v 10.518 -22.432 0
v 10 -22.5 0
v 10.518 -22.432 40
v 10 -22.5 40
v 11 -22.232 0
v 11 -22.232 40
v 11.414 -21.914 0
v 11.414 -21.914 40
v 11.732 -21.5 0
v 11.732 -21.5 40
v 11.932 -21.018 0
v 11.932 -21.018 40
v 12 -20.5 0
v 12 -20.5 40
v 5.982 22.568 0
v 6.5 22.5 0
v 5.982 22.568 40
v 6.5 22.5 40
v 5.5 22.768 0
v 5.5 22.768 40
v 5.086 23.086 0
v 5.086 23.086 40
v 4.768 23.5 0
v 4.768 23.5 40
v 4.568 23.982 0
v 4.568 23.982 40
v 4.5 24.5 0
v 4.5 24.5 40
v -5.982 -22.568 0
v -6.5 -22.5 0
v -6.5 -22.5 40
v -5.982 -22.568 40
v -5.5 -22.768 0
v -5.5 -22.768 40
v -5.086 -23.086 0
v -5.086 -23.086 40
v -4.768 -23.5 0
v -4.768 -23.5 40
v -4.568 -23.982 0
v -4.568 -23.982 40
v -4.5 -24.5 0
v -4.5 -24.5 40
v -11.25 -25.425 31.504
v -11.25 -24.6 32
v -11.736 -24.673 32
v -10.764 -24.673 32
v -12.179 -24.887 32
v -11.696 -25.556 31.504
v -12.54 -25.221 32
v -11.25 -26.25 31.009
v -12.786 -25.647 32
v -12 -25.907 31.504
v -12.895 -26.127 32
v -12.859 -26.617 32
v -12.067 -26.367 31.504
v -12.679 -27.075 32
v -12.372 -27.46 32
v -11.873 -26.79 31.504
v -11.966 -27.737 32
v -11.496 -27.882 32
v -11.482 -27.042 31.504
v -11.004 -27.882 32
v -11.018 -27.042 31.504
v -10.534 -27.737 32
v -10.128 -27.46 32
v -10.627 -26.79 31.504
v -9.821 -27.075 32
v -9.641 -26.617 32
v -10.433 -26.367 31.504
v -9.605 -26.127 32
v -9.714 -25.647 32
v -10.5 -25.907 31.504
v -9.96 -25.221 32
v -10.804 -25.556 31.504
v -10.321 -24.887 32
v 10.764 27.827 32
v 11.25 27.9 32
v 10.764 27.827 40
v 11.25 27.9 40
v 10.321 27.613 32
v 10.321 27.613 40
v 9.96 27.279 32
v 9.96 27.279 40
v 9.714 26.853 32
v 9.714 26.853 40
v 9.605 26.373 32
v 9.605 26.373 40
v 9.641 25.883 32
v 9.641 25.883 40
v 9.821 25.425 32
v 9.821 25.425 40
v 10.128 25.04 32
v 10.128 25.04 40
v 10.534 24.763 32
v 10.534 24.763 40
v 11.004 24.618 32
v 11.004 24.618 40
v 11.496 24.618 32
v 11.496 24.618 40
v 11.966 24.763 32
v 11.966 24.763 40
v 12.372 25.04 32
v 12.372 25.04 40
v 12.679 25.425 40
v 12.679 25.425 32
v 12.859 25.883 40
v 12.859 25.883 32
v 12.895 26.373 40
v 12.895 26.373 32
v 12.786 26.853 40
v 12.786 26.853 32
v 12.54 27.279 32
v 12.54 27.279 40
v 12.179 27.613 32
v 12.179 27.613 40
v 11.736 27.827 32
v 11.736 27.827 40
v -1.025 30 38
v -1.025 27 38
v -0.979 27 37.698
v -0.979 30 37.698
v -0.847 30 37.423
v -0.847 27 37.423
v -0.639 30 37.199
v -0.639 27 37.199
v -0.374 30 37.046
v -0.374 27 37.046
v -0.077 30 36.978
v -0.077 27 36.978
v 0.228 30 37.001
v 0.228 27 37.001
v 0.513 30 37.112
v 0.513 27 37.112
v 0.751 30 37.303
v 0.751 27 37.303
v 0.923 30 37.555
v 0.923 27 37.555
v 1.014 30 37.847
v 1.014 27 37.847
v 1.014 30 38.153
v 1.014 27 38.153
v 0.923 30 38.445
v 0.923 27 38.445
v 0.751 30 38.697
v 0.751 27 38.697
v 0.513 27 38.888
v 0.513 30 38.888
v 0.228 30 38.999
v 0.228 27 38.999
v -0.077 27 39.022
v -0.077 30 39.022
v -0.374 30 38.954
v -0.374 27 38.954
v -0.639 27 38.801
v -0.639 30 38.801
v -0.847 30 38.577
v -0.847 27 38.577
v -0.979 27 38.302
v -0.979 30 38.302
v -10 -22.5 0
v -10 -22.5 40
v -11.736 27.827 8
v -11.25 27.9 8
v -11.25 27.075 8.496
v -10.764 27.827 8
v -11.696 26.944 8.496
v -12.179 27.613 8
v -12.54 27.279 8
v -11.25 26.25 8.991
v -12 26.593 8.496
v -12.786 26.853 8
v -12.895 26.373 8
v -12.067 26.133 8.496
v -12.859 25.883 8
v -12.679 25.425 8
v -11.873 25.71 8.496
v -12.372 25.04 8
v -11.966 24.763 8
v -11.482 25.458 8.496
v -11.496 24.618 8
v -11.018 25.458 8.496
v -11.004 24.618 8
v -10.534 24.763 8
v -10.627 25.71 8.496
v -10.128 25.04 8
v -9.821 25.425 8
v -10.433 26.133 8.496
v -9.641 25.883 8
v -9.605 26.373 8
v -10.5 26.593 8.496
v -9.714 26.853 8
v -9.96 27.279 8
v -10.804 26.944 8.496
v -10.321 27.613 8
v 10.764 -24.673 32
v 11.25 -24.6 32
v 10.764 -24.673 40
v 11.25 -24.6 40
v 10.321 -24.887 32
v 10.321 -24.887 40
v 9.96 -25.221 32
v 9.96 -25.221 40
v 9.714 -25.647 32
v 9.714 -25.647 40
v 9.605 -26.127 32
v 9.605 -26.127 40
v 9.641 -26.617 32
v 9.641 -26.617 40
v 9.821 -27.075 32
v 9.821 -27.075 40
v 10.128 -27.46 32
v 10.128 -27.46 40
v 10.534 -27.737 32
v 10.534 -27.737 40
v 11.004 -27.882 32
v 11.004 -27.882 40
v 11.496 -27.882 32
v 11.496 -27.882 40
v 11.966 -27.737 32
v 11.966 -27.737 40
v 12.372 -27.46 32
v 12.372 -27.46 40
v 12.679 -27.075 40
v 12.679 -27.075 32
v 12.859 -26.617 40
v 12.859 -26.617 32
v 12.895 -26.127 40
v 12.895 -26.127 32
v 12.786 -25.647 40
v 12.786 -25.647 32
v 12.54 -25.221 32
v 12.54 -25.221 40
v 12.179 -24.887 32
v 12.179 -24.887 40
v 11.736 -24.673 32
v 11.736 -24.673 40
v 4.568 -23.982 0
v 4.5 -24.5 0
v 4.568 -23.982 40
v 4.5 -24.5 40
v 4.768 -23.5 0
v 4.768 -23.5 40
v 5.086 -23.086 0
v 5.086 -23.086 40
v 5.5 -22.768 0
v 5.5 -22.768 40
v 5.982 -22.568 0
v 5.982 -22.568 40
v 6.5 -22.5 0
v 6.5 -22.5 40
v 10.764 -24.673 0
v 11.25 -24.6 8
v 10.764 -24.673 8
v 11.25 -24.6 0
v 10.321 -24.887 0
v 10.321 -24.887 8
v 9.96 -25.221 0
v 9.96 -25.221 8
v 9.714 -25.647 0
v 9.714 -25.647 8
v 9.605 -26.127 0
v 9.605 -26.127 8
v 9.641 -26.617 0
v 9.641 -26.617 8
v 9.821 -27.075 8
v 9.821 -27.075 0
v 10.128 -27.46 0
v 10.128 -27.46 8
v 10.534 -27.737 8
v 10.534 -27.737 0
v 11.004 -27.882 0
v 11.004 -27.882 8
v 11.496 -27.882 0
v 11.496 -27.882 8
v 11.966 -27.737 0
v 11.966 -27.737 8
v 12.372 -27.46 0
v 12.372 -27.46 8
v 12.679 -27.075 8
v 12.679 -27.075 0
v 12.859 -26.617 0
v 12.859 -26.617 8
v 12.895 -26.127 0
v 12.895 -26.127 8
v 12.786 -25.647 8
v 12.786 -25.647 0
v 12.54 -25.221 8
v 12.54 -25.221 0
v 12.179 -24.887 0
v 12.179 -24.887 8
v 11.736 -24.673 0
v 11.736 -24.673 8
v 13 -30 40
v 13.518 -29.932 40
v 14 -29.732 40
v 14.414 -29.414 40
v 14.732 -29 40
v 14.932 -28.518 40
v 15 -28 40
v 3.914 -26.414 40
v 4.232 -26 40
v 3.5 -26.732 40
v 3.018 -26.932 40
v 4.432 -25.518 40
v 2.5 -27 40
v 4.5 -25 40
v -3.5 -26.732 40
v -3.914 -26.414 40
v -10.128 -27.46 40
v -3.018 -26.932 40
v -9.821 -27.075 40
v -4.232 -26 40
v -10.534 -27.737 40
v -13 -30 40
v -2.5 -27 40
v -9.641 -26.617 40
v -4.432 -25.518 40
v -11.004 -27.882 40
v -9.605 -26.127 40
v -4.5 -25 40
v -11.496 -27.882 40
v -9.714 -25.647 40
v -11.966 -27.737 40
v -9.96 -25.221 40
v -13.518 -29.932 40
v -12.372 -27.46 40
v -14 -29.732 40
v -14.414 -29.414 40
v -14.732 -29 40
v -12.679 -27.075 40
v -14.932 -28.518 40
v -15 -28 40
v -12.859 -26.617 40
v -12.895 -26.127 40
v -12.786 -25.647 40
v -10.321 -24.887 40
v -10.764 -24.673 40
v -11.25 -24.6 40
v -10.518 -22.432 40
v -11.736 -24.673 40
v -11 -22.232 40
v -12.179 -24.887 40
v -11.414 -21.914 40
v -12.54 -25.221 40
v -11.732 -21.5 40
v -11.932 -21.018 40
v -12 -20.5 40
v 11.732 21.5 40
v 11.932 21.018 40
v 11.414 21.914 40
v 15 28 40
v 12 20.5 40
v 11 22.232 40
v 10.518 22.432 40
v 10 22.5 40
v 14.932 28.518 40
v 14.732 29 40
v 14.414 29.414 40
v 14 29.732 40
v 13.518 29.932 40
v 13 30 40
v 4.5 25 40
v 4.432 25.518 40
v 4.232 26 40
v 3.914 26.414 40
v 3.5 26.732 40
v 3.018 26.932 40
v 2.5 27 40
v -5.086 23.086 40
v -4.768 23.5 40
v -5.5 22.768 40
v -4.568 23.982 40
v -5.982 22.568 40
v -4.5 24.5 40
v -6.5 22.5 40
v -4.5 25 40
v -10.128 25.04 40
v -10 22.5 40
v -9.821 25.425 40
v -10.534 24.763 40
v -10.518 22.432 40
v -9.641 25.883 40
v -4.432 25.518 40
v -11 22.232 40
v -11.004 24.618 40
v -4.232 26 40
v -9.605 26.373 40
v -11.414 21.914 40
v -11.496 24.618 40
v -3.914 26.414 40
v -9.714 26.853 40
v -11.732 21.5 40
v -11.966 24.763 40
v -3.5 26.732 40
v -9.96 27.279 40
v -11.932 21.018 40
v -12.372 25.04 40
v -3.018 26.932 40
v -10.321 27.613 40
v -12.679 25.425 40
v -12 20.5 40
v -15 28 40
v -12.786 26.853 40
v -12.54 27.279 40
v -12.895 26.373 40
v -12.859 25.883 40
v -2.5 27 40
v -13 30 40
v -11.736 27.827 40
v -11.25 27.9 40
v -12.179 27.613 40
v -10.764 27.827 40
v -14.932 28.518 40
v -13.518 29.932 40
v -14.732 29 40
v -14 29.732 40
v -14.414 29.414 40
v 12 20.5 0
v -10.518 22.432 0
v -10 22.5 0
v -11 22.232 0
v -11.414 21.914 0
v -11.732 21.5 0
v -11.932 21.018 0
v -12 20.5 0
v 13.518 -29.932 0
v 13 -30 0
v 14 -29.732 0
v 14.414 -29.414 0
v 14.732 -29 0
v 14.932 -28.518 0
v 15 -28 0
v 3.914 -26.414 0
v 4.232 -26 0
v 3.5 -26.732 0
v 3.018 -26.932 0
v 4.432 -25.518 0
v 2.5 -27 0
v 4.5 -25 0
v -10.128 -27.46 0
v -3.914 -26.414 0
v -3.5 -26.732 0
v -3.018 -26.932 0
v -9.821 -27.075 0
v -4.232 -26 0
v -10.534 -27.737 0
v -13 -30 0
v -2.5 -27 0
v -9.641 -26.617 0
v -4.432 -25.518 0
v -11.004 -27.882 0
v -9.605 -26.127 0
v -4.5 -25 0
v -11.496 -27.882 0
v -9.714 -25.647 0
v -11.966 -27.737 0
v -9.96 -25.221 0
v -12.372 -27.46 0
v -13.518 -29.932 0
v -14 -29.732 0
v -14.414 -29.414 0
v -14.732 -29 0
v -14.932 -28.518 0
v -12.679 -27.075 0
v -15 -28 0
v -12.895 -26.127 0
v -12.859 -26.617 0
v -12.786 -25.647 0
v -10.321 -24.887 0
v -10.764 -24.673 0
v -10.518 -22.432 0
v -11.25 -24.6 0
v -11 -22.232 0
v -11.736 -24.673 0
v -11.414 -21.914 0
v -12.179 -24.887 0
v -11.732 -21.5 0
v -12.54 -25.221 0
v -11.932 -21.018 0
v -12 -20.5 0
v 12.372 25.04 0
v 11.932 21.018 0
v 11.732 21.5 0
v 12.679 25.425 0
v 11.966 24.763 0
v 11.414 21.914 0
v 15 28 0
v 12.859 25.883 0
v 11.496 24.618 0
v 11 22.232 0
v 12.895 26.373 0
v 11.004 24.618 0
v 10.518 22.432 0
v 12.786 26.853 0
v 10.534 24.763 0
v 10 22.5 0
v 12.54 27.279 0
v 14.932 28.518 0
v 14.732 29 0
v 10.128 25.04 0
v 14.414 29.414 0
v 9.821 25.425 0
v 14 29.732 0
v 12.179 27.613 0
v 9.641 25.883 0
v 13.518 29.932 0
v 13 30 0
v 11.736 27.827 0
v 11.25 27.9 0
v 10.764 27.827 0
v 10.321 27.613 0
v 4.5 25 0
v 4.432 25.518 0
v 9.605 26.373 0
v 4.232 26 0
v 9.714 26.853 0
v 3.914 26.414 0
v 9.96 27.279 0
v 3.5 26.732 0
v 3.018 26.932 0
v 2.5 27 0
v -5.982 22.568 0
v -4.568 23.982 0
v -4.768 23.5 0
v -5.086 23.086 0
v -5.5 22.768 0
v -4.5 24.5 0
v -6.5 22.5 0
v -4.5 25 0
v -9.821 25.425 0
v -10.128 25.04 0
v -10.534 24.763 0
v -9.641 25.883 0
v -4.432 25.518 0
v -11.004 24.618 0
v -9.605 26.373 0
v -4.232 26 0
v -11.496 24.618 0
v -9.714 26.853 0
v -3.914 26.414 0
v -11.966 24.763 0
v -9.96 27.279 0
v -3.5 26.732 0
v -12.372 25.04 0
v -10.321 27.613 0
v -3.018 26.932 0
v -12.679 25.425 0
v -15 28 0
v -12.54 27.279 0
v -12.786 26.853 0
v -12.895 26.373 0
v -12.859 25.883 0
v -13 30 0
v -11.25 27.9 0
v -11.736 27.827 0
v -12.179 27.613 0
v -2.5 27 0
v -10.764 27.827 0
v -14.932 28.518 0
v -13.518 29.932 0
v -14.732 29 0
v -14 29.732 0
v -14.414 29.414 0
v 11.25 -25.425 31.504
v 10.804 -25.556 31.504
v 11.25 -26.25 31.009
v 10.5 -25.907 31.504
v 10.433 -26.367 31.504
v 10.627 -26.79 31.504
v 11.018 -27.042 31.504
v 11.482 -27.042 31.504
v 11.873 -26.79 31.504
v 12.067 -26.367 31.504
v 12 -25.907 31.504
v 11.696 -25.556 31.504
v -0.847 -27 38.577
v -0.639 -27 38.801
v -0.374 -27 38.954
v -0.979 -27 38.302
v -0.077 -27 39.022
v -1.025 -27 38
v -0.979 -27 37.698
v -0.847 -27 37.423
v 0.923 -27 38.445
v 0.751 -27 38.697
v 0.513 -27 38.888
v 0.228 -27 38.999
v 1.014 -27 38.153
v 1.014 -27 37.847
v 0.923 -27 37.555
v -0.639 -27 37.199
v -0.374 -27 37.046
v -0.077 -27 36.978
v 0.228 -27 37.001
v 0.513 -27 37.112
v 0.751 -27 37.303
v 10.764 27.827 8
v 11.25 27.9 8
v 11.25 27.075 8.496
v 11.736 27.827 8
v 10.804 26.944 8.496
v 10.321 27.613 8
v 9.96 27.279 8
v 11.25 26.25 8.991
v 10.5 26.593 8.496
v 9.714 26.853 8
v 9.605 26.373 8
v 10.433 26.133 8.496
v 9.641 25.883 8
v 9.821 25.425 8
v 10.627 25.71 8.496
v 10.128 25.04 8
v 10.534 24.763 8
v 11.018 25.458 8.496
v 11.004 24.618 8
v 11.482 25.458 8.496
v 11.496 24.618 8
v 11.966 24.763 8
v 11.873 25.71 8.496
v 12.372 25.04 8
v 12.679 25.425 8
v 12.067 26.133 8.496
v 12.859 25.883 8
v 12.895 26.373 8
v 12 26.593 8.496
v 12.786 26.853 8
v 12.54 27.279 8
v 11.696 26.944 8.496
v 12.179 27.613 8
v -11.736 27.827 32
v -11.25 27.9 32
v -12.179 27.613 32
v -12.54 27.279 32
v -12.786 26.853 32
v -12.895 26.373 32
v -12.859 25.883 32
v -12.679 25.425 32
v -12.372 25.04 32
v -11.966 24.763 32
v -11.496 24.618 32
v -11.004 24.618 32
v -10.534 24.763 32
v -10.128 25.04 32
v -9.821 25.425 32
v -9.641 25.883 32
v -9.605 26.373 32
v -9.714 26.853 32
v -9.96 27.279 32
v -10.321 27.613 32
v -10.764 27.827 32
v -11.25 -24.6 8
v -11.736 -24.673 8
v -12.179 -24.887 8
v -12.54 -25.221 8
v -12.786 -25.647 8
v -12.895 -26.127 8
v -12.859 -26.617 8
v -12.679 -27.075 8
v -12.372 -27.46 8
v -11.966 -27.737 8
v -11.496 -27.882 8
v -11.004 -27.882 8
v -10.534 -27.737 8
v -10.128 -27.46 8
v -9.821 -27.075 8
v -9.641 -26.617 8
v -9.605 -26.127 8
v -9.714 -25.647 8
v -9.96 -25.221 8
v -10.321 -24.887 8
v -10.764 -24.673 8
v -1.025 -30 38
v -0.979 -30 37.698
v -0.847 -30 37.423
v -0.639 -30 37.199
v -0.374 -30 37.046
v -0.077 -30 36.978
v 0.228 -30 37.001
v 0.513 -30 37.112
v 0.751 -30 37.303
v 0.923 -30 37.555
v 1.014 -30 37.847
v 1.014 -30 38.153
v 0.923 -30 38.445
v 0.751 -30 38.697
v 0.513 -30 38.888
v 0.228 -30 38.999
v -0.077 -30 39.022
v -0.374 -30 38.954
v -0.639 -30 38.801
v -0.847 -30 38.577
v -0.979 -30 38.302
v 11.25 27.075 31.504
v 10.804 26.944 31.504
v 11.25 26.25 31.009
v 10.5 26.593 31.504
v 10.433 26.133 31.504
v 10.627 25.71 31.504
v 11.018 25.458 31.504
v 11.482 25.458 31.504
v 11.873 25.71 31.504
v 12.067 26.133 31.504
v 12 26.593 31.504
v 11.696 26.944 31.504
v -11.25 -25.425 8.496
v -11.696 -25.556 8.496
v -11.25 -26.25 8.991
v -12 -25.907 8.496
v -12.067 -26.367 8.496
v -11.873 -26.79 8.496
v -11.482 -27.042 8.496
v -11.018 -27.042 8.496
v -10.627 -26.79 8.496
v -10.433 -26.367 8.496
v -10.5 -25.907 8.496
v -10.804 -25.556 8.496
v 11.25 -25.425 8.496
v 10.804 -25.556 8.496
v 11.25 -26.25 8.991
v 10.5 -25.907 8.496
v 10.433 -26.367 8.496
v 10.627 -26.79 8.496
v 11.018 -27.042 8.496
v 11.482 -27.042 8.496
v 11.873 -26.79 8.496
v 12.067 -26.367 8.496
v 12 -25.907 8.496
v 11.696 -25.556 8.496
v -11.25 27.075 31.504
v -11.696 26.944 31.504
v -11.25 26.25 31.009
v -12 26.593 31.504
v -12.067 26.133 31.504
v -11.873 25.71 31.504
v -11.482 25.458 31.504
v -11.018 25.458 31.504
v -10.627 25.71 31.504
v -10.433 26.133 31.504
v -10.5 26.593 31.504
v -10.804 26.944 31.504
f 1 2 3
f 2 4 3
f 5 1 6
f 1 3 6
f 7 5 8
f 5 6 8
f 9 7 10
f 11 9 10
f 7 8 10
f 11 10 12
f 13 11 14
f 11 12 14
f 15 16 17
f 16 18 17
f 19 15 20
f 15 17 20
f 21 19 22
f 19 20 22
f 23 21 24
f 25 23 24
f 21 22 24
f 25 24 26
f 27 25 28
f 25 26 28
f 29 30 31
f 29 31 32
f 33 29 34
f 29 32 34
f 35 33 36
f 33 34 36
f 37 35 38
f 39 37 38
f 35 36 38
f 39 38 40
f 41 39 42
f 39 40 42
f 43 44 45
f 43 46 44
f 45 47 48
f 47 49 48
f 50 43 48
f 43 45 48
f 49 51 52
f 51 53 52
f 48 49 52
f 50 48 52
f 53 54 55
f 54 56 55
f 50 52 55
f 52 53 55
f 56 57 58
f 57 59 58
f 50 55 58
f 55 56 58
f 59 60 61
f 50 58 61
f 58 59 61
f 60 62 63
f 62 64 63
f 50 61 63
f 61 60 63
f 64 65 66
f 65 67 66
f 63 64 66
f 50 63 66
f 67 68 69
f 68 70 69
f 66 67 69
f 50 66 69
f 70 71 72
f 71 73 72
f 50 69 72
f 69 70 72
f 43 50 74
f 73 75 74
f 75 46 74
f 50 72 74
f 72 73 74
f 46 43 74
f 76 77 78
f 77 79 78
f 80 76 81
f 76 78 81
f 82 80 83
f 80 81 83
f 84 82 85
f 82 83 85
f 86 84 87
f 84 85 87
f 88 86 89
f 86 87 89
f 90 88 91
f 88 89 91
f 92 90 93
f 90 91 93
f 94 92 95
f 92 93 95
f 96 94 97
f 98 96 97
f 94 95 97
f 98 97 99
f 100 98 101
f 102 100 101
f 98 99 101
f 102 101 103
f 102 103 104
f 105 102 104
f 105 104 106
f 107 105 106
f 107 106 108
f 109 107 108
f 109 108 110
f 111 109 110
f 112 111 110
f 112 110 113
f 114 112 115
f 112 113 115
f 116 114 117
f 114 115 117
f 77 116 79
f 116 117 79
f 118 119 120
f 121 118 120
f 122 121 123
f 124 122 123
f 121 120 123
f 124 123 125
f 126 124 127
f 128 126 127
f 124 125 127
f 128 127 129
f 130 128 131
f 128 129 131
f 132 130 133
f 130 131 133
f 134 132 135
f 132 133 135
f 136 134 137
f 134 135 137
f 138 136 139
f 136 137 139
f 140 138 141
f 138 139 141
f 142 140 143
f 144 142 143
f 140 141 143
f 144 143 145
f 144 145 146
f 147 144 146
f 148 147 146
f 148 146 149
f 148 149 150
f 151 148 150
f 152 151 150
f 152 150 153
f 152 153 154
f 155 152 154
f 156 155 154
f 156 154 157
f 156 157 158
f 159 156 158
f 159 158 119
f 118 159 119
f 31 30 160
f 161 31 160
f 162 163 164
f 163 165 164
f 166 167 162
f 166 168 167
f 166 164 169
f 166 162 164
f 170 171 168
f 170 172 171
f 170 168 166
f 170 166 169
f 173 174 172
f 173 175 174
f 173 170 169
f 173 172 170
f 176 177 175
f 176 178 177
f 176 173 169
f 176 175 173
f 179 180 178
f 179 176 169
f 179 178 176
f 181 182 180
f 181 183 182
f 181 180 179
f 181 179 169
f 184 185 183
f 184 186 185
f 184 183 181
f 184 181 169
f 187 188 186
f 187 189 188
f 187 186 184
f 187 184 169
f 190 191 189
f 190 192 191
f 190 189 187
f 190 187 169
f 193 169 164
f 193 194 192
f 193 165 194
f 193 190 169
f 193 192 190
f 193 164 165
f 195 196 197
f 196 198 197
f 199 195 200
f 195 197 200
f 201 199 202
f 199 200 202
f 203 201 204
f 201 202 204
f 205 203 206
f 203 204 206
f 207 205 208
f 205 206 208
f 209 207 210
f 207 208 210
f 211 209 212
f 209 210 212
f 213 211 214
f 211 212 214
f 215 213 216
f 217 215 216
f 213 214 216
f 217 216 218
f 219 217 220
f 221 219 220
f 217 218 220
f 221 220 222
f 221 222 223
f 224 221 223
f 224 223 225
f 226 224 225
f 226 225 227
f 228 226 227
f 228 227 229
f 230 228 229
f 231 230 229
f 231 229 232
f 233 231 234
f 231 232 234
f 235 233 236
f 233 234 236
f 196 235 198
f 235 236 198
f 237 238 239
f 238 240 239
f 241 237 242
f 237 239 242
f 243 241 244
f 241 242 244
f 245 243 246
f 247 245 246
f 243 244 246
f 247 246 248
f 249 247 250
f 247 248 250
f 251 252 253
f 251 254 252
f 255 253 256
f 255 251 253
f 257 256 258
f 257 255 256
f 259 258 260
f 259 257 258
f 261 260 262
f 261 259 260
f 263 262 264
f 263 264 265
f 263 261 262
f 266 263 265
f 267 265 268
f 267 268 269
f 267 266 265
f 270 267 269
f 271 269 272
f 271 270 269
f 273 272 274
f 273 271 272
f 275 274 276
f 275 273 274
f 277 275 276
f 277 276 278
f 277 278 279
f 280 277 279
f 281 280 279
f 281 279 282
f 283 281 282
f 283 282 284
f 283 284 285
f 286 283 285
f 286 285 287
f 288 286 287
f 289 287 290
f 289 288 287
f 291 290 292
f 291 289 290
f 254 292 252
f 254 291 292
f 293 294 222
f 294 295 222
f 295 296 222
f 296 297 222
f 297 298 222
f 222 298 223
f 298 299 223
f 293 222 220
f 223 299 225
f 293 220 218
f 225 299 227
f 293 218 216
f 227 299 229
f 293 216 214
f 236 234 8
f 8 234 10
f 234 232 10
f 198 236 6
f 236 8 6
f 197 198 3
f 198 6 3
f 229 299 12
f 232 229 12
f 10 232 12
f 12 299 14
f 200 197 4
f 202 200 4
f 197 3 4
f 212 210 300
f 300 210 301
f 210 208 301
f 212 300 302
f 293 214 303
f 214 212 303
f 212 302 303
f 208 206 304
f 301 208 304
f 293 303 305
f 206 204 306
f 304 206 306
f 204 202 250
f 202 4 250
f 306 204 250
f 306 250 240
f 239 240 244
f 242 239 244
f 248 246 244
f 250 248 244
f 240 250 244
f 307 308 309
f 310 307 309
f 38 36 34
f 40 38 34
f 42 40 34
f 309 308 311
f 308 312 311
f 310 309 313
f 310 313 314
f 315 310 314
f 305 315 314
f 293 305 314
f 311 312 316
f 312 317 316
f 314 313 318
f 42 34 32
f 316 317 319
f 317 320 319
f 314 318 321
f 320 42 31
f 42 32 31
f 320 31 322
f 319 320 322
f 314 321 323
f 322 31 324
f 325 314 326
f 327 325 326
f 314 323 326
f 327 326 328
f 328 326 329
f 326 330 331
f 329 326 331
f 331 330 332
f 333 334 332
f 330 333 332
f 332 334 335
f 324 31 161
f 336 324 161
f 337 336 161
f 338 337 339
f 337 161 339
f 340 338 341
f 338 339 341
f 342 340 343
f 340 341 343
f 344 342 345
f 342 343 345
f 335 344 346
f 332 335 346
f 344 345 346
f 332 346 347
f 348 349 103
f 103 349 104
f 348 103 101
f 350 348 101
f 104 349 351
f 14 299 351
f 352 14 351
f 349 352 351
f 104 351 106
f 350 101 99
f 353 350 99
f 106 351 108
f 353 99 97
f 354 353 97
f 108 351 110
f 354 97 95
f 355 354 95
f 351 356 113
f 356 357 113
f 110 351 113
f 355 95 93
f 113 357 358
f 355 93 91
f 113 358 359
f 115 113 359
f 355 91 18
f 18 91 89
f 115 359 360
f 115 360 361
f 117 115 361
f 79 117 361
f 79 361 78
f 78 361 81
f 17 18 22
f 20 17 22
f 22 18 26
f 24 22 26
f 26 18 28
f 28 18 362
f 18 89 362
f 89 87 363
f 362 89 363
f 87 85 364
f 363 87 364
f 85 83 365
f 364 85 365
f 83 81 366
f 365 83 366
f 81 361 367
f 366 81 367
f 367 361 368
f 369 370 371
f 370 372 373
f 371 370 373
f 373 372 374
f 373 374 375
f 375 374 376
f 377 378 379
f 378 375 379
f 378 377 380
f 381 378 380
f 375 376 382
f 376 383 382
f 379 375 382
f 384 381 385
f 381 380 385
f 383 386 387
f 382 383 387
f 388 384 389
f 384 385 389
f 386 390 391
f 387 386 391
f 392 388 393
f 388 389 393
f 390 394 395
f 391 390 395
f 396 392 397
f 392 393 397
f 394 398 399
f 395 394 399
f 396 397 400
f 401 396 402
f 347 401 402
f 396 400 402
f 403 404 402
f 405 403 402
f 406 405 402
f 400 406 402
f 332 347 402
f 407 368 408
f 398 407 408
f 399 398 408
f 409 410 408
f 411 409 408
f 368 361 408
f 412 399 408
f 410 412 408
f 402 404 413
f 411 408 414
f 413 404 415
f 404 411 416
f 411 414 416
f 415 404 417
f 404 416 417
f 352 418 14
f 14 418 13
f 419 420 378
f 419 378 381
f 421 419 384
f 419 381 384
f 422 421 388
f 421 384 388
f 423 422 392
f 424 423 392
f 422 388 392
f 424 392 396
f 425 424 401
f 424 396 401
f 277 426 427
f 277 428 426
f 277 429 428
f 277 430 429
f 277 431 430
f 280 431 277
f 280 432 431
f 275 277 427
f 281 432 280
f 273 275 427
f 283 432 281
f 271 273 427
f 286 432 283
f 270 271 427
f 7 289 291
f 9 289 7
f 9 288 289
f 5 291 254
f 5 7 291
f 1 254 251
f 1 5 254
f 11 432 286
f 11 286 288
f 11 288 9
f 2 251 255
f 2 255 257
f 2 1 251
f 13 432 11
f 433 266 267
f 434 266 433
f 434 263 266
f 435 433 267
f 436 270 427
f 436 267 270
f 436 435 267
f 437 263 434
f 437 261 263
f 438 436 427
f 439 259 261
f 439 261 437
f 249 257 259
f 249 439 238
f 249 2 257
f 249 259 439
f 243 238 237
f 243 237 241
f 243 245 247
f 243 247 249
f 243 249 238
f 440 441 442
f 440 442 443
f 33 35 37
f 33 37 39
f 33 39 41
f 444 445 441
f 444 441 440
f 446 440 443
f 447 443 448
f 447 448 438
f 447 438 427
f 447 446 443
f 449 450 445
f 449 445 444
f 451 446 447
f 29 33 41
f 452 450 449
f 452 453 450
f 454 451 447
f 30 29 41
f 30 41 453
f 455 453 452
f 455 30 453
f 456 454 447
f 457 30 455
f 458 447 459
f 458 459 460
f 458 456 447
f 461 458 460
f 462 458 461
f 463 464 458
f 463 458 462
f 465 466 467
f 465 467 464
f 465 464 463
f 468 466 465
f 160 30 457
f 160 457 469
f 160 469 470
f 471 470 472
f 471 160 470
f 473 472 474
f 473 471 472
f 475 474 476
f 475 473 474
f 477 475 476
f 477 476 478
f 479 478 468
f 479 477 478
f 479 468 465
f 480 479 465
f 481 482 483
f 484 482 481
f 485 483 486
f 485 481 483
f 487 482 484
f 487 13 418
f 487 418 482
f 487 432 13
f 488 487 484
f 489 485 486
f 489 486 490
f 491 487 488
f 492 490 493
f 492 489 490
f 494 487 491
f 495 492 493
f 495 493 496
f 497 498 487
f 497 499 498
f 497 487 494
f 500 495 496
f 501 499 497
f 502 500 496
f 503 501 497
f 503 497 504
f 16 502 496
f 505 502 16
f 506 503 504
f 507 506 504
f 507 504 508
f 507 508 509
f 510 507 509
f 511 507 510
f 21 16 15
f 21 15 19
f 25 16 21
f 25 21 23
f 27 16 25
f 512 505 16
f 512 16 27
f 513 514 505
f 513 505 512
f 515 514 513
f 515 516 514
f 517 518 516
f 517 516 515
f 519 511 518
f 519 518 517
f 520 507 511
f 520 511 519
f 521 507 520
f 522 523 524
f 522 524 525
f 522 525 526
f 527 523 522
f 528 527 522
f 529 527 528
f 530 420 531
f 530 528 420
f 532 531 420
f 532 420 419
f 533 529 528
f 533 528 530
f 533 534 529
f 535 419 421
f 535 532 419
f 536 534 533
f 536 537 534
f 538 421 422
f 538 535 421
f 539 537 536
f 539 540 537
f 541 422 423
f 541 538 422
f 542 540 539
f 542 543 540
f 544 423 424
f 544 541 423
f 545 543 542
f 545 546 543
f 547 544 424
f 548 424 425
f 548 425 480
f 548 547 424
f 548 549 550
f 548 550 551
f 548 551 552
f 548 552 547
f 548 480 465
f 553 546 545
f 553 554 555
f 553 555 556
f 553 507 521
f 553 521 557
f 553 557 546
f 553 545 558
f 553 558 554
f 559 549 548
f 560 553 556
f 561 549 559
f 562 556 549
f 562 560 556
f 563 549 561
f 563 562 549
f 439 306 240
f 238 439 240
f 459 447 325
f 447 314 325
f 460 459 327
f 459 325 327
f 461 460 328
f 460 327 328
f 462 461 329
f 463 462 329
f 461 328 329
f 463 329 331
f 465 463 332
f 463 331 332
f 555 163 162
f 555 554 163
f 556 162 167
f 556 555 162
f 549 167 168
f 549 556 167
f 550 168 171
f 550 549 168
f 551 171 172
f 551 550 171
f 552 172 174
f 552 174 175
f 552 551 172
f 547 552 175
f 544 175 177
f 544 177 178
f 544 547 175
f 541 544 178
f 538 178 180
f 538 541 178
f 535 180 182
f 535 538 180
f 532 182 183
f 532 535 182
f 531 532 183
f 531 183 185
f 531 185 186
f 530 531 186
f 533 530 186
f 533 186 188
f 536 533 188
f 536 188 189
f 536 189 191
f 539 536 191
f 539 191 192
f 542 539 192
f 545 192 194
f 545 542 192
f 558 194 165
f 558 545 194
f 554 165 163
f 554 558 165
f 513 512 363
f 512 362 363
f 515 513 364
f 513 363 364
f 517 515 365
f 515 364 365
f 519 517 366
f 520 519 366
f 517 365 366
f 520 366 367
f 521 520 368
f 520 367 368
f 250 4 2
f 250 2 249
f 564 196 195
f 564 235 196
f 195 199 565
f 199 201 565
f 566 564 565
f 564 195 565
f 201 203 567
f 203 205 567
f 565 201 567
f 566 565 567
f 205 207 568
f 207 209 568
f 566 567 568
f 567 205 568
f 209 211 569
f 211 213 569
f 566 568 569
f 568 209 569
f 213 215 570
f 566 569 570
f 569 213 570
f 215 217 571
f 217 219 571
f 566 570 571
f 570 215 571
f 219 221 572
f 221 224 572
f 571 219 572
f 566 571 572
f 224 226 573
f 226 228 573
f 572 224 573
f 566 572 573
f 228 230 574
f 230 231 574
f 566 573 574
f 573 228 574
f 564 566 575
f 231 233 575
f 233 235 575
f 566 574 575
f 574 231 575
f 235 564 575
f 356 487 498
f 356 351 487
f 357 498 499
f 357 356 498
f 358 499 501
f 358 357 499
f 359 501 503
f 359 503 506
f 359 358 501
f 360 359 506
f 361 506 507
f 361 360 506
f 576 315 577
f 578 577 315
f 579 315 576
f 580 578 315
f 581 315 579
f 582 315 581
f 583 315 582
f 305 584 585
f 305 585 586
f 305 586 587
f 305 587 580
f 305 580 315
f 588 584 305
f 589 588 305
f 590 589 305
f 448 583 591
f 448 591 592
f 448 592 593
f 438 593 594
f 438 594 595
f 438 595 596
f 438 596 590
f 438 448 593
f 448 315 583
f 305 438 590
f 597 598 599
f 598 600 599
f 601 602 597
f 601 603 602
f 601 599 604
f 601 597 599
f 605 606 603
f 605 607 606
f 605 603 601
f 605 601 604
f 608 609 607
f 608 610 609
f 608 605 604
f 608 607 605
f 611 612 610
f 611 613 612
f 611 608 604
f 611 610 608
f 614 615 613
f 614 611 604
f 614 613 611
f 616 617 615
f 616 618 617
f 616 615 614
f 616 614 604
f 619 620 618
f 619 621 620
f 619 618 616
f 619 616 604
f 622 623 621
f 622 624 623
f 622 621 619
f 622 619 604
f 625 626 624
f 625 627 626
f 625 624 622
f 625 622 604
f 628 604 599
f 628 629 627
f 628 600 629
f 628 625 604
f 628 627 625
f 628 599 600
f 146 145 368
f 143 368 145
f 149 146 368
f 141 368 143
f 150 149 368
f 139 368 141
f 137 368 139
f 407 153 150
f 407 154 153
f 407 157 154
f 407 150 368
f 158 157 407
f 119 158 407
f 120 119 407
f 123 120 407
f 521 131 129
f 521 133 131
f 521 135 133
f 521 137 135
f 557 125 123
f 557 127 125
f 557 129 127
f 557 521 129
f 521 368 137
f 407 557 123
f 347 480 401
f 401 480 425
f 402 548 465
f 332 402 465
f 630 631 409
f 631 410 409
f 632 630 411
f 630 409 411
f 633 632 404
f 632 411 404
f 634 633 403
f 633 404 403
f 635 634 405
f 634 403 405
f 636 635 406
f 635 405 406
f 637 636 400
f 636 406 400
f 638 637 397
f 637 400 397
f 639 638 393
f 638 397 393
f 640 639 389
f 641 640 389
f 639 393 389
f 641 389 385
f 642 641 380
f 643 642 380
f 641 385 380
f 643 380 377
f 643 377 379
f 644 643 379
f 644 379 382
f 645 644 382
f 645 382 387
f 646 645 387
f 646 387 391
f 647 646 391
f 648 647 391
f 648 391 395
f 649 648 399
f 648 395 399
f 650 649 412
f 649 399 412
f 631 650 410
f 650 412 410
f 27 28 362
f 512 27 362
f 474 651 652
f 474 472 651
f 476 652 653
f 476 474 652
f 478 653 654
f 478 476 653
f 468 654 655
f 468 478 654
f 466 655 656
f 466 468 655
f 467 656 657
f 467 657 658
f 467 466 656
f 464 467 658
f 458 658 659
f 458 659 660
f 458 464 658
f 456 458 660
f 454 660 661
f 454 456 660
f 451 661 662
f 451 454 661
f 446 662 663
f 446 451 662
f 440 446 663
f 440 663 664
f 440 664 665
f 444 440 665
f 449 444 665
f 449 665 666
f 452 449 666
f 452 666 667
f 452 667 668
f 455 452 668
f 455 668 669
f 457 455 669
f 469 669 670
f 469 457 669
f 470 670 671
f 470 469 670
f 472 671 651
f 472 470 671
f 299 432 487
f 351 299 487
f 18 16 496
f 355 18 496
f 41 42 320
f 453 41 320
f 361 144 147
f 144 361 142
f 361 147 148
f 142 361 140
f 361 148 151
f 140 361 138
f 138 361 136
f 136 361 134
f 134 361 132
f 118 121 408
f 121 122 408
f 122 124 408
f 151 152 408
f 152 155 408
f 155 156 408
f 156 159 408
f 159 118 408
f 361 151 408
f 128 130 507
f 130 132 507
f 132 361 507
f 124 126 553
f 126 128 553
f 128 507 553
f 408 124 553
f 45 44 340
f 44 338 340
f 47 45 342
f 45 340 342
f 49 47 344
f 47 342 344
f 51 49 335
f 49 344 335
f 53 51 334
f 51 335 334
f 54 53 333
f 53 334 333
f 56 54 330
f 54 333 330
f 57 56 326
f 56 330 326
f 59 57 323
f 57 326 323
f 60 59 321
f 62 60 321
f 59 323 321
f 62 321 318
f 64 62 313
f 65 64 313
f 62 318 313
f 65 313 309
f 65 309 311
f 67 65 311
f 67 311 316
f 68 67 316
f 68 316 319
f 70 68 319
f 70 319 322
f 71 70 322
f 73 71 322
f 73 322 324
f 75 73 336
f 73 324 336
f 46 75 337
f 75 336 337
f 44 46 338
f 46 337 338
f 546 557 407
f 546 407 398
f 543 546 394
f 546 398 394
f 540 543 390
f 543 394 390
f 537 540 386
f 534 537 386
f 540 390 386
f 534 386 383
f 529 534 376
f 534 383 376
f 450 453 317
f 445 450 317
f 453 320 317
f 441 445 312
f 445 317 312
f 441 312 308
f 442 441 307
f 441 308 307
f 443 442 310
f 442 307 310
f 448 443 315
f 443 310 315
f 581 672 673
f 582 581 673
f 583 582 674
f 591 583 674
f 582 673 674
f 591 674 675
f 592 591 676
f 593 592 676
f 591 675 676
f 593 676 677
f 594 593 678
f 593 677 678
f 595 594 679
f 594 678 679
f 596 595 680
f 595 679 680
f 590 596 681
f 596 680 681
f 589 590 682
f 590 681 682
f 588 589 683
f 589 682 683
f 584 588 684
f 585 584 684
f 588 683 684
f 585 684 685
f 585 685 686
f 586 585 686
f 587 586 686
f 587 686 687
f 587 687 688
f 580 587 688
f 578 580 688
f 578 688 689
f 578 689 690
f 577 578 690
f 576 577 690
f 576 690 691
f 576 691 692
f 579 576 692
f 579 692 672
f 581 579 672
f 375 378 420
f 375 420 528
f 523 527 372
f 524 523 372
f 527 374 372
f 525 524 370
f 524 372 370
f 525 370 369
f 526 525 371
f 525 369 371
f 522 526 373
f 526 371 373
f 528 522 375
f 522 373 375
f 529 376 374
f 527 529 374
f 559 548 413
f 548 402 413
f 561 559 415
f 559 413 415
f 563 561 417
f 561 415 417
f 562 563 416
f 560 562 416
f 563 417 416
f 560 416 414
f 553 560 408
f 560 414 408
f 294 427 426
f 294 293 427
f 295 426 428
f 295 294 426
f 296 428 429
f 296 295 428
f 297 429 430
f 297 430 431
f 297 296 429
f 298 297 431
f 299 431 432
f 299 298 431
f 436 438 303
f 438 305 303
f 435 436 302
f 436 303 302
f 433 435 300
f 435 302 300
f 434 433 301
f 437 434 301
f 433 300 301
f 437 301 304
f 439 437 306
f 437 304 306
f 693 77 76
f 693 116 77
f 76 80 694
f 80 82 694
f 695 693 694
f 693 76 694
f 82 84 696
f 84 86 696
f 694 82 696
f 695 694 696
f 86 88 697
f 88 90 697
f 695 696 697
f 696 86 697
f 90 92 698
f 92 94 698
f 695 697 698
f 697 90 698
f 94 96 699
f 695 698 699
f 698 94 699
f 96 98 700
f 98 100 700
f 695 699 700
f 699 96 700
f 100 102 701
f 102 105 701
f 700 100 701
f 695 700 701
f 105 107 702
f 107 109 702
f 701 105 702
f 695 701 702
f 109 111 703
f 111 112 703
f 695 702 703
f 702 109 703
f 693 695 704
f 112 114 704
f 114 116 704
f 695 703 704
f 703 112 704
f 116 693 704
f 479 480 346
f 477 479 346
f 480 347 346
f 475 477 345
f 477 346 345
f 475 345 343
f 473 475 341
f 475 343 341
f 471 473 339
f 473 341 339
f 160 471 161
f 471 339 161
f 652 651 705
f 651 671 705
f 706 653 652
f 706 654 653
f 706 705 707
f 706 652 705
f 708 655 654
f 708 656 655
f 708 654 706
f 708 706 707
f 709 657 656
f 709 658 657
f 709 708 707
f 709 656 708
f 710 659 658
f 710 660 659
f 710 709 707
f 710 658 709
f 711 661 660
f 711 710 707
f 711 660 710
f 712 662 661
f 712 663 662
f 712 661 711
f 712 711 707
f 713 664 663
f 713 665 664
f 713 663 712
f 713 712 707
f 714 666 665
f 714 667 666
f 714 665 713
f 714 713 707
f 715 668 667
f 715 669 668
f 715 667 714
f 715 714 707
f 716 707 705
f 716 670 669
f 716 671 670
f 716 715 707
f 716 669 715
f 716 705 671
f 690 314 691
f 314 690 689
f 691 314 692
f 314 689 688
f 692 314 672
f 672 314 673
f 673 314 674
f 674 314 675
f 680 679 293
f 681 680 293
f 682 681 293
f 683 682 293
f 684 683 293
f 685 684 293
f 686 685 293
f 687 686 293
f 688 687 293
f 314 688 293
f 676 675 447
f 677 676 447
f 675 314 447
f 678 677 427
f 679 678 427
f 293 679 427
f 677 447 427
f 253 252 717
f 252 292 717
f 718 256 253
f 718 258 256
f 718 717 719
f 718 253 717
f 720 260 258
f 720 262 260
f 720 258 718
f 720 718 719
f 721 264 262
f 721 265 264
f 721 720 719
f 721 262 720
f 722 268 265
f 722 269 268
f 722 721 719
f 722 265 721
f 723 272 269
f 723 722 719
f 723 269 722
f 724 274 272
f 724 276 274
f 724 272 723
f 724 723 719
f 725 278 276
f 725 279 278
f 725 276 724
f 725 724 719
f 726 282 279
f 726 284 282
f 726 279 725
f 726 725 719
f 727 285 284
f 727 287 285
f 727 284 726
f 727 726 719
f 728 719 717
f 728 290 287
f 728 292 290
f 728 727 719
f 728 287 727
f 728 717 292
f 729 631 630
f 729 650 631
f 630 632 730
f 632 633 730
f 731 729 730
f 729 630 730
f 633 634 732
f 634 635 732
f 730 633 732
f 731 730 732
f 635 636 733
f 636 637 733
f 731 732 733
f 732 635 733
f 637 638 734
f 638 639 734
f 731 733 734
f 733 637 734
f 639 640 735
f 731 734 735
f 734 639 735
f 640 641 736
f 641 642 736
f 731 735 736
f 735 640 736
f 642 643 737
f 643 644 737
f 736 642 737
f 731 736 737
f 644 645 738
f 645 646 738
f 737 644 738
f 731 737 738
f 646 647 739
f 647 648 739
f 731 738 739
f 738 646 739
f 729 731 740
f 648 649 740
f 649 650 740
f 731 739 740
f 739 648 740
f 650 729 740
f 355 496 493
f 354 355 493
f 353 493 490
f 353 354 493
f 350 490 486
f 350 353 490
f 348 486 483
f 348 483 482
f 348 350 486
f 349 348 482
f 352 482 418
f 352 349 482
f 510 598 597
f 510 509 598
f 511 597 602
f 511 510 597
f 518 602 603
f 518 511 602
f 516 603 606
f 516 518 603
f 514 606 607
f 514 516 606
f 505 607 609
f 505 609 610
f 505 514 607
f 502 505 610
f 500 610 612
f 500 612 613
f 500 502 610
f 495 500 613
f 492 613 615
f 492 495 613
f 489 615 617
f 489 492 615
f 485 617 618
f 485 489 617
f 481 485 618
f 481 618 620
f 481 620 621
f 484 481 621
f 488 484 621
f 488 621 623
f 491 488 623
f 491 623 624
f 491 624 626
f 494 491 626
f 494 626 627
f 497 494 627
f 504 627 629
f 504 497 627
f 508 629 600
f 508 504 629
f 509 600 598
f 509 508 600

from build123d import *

# Parameters (mm, degrees)
SKETCH_1_W                  = 7.5
SKETCH_1_H                  = 7.5
EXTRUDE_1_DEPTH             = 40
FILLET_1_R                  = 2
HOLE_WIZARD_M2_5_1_D        = 2.05
HOLE_WIZARD_M4_1_AT_2_COUNT = 2
HOLE_WIZARD_M4_1_AT_2_PITCH = 22.5
HOLE_WIZARD_M4_1_AT_3_COUNT = 2
HOLE_WIZARD_M4_1_AT_3_PITCH = 57.118298294
HOLE_WIZARD_M4_1_AT_4_COUNT = 2
HOLE_WIZARD_M4_1_AT_4_PITCH = 52.5
FILLET_2_R                  = 2


with BuildPart() as part:
    # 草图1 → 凸台-拉伸1 (new body)
    with BuildSketch(Plane.XY):
        Polygon((7.5, 22.5), (4.5, 22.5), (4.5, 27), (-4.5, 27), (-4.5, 22.5), (-7.5, 22.5), (-7.5, 30), (7.5, 30), align=None)
        with Locations((-11.25, 26.25)):
            Rectangle(SKETCH_1_W, SKETCH_1_H)
        with Locations((11.25, 26.25)):
            Rectangle(SKETCH_1_W, SKETCH_1_H)
        Polygon((12, 22.5), (12, 19.5), (12, -19.5), (12, -22.5), (15, -22.5), (15, 22.5), align=None)
        Polygon((-12, 22.5), (-15, 22.5), (-15, -22.5), (-12, -22.5), (-12, -19.5), (-12, 19.5), align=None)
        with Locations((-11.25, -26.25)):
            Rectangle(SKETCH_1_W, SKETCH_1_H)
        with Locations((11.25, -26.25)):
            Rectangle(SKETCH_1_W, SKETCH_1_H)
        Polygon((7.5, -30), (-7.5, -30), (-7.5, -22.5), (-4.5, -22.5), (-4.5, -27), (4.5, -27), (4.5, -22.5), (7.5, -22.5), align=None)
    extrude(amount=EXTRUDE_1_DEPTH)

    # 圆角1
    fillet_1_edges = [part.edges().sort_by_distance(p)[0] for p in [
        (12, -22.5, 20),
        (12, 22.5, 20),
        (4.5, 22.5, 20),
        (4.5, 27, 20),
        (-4.5, 27, 20),
        (-4.5, 22.5, 20),
        (-12, 22.5, 20),
        (-12, -22.5, 20),
        (-4.5, -22.5, 20),
        (-4.5, -27, 20),
        (4.5, -27, 20),
        (4.5, -22.5, 20),
    ]]
    fillet(fillet_1_edges, radius=FILLET_1_R)

    # M2.5 螺纹孔1 (through all)
    with Locations(Plane(origin=(0, 30, 0), x_dir=(1, 0, 0), z_dir=(0, 1, 0))):
        with Locations((0, -38)):
            Hole(HOLE_WIZARD_M2_5_1_D / 2)

    # 草图14 → M4 螺纹孔1 (revolve, cut)
    with BuildSketch(Plane(origin=(11.25, 26.25, 0), x_dir=(0, 1, 0), z_dir=(1, 0, 0))):
        Polygon((0, 0), (0, 8.991420021), (1.65, 8), (1.65, 0), align=None)
    hole_wizard_m4_1 = revolve(axis=Axis((11.25, 26.25, -6.35), (0, 0, 1)), mode=Mode.SUBTRACT)

    # M4 螺纹孔1 at 2: M4 螺纹孔1 ×2
    with Locations(*[(-i * HOLE_WIZARD_M4_1_AT_2_PITCH, 0, 0) for i in range(1, HOLE_WIZARD_M4_1_AT_2_COUNT)]):
        add(hole_wizard_m4_1, mode=Mode.SUBTRACT)

    # M4 螺纹孔1 at 3: M4 螺纹孔1 ×2
    with Locations(*[Vector(-0.393919299, -0.91914503, 0) * (i * HOLE_WIZARD_M4_1_AT_3_PITCH) for i in range(1, HOLE_WIZARD_M4_1_AT_3_COUNT)]):
        add(hole_wizard_m4_1, mode=Mode.SUBTRACT)

    # M4 螺纹孔1 at 4: M4 螺纹孔1 ×2
    with Locations(*[(0, -i * HOLE_WIZARD_M4_1_AT_4_PITCH, 0) for i in range(1, HOLE_WIZARD_M4_1_AT_4_COUNT)]):
        add(hole_wizard_m4_1, mode=Mode.SUBTRACT)

    # 镜向1: M4 螺纹孔1 across plane
    add(hole_wizard_m4_1.mirror(Plane(origin=(0, 0, 20), x_dir=(1, 0, 0), z_dir=(0, 0, -1))), mode=Mode.SUBTRACT)

    # 镜向1 copy 1 sketch → 镜向1 copy 1 (revolve, cut)
    with BuildSketch(Plane(origin=(-11.25, 26.25, 40), x_dir=(0, 1, 0), z_dir=(1, 0, 0))):
        Polygon((0, 0), (0, -8.991420021), (1.65, -8), (1.65, 0), align=None)
    revolve(axis=Axis((-11.25, 26.25, 46.35), (0, 0, 1)), mode=Mode.SUBTRACT)

    # 镜向1 copy 2 sketch → 镜向1 copy 2 (revolve, cut)
    with BuildSketch(Plane(origin=(-11.25, -26.25, 40), x_dir=(0, 1, 0), z_dir=(1, 0, 0))):
        Polygon((0, 0), (0, -8.991420021), (1.65, -8), (1.65, 0), align=None)
    revolve(axis=Axis((-11.25, -26.25, 46.35), (0, 0, 1)), mode=Mode.SUBTRACT)

    # 镜向1 copy 3 sketch → 镜向1 copy 3 (revolve, cut)
    with BuildSketch(Plane(origin=(11.25, -26.25, 40), x_dir=(0, 1, 0), z_dir=(1, 0, 0))):
        Polygon((0, 0), (0, -8.991420021), (1.65, -8), (1.65, 0), align=None)
    revolve(axis=Axis((11.25, -26.25, 46.35), (0, 0, 1)), mode=Mode.SUBTRACT)

    # 圆角2
    fillet_2_edges = [part.edges().sort_by_distance(p)[0] for p in [
        (-15, -30, 20),
        (-15, 30, 20),
        (15, 30, 20),
        (15, -30, 20),
    ]]
    fillet(fillet_2_edges, radius=FILLET_2_R)


solid = part.part
